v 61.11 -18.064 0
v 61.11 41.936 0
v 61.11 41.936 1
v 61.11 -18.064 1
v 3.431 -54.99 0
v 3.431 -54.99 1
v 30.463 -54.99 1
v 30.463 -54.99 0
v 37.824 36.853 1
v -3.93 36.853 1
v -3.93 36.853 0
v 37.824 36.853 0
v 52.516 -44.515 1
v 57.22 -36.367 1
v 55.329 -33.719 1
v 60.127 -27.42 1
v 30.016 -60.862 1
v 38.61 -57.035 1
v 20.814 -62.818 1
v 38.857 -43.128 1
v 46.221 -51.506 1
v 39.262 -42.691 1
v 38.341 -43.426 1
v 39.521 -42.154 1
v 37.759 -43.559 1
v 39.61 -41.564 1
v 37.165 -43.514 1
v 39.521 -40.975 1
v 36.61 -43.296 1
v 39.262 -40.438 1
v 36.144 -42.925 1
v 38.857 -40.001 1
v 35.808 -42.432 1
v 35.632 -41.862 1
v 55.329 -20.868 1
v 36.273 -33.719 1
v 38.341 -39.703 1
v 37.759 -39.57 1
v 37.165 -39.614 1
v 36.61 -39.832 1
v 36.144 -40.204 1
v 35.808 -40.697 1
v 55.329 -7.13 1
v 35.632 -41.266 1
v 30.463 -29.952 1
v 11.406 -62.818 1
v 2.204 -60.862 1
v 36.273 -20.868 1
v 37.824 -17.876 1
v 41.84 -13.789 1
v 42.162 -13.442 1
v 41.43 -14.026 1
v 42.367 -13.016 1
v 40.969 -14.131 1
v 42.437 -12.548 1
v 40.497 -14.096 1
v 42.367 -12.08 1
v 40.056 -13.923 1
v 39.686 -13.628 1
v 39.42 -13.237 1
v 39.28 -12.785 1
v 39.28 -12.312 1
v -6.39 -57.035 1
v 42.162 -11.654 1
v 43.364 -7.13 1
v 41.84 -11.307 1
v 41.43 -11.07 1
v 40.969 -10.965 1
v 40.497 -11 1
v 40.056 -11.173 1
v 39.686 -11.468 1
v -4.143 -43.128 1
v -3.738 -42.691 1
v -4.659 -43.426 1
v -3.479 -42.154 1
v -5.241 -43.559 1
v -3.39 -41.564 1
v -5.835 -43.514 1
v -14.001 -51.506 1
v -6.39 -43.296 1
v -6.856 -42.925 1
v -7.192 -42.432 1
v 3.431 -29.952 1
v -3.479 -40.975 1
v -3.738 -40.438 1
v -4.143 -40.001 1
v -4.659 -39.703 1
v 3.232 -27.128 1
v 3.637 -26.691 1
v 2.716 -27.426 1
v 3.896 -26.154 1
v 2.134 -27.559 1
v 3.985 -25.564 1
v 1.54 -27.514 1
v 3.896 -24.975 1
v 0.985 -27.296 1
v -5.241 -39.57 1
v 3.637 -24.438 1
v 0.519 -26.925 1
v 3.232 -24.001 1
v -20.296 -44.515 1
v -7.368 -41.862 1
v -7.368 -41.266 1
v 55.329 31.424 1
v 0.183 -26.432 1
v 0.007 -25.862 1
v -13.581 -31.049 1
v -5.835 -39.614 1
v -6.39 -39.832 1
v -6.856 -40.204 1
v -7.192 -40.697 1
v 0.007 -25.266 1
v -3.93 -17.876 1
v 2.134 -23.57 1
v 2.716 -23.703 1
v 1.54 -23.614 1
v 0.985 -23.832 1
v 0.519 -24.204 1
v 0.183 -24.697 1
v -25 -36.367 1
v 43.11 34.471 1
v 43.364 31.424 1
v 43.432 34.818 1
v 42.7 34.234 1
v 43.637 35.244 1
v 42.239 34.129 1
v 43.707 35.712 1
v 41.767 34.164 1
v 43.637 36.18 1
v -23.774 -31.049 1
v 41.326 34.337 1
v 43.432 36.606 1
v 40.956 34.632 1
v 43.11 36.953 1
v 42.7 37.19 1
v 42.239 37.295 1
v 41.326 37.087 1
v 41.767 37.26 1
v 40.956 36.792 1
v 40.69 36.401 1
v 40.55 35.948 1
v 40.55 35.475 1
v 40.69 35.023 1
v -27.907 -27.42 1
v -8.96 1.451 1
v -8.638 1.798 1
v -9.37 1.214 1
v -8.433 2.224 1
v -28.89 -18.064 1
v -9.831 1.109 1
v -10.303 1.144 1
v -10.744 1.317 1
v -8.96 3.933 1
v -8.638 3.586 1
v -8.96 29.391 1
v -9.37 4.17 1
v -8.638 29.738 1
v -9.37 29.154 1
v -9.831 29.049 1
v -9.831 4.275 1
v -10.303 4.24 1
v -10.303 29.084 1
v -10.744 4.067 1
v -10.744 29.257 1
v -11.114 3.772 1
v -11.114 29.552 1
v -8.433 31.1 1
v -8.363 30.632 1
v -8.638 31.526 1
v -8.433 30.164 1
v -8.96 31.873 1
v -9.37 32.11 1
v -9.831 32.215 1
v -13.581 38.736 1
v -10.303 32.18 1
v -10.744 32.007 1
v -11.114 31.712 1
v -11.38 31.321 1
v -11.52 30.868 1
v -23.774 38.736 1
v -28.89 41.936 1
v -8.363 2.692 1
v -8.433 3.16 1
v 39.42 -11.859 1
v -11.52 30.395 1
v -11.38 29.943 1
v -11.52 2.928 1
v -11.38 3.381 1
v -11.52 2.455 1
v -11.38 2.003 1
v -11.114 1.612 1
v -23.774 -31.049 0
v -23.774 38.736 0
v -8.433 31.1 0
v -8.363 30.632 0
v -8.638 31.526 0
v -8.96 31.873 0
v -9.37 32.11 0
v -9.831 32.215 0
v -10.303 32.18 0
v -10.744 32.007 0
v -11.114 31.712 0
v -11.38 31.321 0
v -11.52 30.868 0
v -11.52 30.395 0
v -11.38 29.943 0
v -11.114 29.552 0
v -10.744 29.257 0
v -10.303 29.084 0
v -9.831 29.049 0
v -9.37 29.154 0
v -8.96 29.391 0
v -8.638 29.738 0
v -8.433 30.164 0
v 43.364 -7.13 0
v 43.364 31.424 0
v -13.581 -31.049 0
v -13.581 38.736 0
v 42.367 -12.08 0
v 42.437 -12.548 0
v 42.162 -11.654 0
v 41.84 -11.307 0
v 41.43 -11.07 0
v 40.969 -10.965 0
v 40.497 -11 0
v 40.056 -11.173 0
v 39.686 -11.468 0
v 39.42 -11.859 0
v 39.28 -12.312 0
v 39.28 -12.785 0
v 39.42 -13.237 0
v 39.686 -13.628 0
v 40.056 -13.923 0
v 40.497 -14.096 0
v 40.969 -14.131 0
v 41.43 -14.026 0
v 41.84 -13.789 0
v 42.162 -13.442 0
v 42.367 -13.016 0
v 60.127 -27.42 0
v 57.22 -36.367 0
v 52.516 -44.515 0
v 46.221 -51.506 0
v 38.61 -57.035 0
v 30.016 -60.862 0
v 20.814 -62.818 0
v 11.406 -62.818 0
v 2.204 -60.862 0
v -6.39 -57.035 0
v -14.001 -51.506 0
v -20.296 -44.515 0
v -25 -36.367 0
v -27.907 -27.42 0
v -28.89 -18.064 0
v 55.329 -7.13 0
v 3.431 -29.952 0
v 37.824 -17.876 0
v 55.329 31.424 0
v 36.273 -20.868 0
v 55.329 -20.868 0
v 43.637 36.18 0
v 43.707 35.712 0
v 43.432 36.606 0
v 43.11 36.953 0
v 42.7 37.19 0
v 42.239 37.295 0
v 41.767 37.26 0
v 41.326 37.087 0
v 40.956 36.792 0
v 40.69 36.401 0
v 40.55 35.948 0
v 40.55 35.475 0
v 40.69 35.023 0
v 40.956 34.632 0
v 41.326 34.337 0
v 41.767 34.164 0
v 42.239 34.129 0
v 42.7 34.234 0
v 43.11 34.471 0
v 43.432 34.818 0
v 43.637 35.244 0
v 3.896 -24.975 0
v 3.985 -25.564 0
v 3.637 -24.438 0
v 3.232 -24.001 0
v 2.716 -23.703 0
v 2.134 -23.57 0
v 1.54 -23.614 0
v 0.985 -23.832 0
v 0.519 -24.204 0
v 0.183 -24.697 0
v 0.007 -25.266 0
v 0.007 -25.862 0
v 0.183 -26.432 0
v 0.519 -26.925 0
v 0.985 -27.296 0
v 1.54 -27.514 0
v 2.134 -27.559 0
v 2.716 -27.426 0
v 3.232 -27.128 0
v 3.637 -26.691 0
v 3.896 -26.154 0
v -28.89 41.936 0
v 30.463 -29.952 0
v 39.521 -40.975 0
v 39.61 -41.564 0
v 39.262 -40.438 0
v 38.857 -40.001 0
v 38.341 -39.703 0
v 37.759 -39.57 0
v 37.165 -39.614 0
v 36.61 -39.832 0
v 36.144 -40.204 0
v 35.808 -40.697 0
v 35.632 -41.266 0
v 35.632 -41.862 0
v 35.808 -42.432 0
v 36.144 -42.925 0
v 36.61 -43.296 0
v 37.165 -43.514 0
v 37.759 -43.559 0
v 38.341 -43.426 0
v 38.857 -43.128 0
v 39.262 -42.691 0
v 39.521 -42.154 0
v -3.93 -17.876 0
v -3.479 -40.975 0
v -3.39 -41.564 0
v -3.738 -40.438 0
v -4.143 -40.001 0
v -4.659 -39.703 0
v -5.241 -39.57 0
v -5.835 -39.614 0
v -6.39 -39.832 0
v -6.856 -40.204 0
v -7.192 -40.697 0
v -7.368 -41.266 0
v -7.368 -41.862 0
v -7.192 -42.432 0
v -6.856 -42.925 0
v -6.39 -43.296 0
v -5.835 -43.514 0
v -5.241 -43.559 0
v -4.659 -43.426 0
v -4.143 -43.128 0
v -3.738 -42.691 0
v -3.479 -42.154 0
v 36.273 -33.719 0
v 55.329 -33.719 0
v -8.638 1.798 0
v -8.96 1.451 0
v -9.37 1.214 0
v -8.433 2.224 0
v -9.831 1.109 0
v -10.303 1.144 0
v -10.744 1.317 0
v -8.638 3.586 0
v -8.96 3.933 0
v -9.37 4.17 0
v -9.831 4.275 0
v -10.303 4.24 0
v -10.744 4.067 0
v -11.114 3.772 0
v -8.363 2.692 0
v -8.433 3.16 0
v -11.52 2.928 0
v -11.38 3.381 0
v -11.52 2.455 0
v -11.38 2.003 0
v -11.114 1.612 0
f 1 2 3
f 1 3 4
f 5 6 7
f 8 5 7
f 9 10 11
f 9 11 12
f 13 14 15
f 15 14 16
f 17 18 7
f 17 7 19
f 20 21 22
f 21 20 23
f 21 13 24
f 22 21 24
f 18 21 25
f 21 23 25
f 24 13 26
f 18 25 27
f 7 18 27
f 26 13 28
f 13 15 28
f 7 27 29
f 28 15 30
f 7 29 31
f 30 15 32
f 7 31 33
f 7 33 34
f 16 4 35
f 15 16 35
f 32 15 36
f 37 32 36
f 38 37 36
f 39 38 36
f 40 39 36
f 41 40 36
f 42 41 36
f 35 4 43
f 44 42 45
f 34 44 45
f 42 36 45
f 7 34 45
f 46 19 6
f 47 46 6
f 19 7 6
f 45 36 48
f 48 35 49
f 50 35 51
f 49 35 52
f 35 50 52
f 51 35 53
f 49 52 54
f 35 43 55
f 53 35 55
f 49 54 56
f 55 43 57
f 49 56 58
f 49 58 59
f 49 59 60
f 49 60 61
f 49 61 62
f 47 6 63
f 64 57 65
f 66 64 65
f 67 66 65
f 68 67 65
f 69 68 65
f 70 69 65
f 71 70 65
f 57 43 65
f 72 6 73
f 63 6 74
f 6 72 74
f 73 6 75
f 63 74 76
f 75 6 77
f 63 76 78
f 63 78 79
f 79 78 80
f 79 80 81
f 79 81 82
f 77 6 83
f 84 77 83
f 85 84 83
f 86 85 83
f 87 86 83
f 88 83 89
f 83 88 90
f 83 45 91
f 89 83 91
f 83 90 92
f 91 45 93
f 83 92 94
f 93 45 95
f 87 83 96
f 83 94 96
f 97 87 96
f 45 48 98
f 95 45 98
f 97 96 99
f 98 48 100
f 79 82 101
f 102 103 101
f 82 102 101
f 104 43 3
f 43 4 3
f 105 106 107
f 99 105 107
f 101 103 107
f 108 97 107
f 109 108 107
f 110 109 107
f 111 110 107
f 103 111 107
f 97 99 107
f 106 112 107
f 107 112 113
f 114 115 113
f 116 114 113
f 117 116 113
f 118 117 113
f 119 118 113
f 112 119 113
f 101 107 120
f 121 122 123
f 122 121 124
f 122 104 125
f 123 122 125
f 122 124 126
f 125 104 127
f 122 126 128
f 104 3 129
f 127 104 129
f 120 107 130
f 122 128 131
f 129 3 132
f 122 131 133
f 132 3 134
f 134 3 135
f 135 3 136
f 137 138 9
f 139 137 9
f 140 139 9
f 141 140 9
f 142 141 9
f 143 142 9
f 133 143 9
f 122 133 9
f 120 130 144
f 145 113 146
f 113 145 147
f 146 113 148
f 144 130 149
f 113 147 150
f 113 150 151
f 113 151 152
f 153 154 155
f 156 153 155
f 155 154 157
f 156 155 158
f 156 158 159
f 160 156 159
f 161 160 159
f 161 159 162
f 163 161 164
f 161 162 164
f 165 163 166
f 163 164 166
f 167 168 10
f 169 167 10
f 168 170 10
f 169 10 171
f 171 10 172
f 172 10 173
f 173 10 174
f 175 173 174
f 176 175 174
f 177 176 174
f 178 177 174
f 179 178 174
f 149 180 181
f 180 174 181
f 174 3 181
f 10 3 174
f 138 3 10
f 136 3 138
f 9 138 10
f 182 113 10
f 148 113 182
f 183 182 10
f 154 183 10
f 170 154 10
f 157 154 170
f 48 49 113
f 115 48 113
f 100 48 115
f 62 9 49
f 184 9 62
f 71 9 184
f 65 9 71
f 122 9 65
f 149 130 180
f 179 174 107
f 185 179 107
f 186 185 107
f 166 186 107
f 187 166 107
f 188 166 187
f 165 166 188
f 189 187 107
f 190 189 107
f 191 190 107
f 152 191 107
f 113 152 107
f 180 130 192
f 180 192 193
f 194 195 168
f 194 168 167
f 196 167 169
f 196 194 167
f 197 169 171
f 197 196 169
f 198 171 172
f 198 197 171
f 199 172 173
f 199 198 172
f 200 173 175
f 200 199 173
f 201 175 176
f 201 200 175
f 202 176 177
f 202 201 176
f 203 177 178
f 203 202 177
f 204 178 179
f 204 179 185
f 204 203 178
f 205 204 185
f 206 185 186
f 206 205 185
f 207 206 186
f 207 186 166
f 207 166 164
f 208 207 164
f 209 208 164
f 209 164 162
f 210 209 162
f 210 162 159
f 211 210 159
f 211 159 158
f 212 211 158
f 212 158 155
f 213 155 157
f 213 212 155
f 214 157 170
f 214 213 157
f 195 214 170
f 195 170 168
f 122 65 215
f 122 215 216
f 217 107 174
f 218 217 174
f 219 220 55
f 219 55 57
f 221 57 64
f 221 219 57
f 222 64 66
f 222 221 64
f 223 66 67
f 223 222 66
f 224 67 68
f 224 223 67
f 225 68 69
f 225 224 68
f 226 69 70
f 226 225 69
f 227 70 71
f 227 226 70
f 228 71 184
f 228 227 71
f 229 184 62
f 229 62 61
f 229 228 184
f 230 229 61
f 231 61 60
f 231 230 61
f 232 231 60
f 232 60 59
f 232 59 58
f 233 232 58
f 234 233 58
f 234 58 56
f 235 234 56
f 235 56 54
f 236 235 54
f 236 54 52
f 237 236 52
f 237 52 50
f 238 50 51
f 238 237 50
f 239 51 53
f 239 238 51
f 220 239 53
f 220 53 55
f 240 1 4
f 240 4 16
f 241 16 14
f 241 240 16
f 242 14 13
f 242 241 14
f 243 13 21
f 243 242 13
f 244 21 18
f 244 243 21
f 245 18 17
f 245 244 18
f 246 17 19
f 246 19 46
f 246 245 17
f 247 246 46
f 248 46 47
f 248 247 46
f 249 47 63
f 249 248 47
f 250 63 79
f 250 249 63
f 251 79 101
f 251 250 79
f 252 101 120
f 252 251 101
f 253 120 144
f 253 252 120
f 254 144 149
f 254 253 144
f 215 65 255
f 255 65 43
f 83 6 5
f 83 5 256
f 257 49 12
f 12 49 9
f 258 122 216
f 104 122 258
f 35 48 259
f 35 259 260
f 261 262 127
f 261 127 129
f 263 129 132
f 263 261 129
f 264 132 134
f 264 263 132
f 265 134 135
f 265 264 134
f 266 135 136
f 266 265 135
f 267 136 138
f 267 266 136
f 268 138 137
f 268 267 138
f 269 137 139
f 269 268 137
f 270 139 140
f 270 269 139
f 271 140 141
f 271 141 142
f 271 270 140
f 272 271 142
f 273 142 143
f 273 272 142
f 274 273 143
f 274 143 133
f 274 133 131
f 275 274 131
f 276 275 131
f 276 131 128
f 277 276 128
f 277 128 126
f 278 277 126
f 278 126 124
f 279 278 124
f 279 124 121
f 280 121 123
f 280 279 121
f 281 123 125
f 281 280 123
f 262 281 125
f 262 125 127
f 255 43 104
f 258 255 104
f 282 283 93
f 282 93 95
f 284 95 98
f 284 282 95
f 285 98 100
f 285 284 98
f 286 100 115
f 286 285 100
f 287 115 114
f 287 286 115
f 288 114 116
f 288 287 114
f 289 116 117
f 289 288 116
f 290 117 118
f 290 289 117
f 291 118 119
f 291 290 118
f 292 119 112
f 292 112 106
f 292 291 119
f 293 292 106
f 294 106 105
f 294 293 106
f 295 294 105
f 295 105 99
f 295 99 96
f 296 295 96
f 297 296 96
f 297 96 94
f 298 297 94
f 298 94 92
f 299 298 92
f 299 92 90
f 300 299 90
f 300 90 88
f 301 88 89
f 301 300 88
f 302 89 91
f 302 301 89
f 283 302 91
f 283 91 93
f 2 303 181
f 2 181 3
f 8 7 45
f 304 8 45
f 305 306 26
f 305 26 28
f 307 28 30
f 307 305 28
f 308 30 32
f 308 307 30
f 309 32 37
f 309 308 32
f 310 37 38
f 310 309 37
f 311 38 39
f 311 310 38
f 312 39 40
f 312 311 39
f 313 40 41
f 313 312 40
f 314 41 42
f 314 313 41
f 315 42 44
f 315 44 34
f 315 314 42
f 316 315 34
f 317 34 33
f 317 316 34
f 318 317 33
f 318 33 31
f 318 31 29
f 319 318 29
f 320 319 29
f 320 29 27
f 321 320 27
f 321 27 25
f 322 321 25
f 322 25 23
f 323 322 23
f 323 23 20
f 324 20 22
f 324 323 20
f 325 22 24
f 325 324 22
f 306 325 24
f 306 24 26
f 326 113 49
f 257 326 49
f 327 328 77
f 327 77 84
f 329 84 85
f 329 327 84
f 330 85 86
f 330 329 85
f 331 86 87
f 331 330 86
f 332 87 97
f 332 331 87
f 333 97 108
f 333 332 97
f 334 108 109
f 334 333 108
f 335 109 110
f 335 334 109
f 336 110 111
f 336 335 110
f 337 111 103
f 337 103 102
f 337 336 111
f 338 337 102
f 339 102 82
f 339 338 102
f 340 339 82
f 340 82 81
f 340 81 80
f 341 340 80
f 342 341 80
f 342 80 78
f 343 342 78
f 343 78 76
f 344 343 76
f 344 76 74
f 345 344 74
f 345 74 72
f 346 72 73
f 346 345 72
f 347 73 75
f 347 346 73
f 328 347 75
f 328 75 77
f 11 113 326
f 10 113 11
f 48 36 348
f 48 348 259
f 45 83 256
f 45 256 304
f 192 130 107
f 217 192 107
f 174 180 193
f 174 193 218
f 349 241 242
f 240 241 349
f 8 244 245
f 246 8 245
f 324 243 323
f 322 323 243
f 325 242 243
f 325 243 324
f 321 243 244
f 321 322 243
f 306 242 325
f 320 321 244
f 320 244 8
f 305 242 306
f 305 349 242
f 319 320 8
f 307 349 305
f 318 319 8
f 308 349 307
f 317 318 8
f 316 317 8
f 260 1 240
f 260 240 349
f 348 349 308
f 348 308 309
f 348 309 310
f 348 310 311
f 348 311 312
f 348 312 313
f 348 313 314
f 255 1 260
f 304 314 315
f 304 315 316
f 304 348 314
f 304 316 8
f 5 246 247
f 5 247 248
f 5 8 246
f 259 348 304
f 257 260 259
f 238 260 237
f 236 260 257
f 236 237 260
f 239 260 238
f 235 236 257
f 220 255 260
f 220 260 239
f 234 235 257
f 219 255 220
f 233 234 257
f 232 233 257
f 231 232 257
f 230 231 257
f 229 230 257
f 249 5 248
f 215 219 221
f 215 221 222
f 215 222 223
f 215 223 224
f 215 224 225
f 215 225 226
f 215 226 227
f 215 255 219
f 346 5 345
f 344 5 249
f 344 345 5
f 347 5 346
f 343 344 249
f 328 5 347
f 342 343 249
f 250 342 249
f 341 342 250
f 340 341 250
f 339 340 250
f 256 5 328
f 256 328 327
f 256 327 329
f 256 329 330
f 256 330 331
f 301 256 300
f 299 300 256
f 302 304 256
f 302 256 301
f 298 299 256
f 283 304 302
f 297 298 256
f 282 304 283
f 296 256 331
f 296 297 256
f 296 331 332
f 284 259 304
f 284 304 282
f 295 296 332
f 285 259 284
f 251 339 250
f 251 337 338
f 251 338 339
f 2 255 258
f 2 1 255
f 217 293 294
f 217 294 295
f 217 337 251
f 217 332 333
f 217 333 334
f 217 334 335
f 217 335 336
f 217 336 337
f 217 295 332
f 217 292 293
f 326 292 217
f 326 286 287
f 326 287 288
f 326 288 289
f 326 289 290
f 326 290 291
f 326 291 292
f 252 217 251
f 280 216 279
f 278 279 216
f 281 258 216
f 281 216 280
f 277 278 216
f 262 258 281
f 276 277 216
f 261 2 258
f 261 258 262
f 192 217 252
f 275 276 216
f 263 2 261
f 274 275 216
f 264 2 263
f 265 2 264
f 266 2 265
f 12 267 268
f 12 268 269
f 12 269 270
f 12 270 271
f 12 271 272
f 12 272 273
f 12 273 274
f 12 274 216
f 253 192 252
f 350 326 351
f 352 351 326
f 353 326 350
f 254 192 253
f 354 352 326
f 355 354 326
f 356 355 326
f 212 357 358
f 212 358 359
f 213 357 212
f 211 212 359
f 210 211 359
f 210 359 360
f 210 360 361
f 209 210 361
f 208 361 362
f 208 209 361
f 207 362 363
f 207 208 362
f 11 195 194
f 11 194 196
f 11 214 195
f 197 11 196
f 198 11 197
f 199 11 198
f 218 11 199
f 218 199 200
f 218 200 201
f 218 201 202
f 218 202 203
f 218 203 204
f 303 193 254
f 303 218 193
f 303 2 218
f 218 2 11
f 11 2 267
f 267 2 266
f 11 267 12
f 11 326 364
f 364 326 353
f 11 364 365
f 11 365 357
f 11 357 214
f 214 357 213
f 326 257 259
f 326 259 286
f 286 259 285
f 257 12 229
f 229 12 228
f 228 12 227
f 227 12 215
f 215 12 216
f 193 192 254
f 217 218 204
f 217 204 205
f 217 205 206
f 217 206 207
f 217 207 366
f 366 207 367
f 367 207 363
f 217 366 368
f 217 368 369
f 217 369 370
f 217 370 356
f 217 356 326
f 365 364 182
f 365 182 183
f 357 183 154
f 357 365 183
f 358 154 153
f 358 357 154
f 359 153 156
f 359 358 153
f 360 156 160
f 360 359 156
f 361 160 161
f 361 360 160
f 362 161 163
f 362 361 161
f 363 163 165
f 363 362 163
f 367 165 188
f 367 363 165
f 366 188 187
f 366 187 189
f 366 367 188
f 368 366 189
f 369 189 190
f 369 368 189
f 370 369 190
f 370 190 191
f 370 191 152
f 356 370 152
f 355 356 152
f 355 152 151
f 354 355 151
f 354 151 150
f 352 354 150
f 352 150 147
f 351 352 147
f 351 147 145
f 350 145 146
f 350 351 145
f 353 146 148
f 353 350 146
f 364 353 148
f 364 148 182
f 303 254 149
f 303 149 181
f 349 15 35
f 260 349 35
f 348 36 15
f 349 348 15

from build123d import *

# Parameters (mm, degrees)
SKETCH1_R           = 2
SKETCH1_R_2         = 1.5875
BOSS_EXTRUDE1_DEPTH = 1
SKETCH2_W           = 41.754758497
SKETCH2_H           = 54.729261875
SKETCH2_W_2         = 10.192494114
SKETCH2_H_2         = 69.784905138
SKETCH2_W_3         = 27.032266999
SKETCH2_H_3         = 25.038083368
SKETCH2_W_4         = 11.965101787
SKETCH2_H_4         = 38.554216868
SKETCH2_W_5         = 19.055532475
SKETCH2_H_5         = 12.851405623
CUT_EXTRUDE1_DEPTH  = 2


with BuildPart() as part:
    # Sketch1 → Boss-Extrude1 (new body)
    with BuildSketch(Plane.XY):
        with BuildLine():
            Line((61.109996011, 41.935724429), (61.109996011, -18.064275571))
            ThreePointArc((61.109996011, -18.064275571), (16.109996011, -63.064275571), (-28.890003989, -18.064275571))
            Line((-28.890003989, -18.064275571), (-28.890003989, 41.935724429))
            Line((-28.890003989, 41.935724429), (61.109996011, 41.935724429))
        make_face()
        with Locations((37.609996011, -41.564275571)):
            Circle(SKETCH1_R, mode=Mode.SUBTRACT)
        with Locations((-5.390003989, -41.564275571)):
            Circle(SKETCH1_R, mode=Mode.SUBTRACT)
        with Locations((1.984996011, -25.564275571)):
            Circle(SKETCH1_R, mode=Mode.SUBTRACT)
        with Locations((-9.950003989, 2.691836123)):
            Circle(SKETCH1_R_2, mode=Mode.SUBTRACT)
        with Locations((40.849996011, -12.548163877)):
            Circle(SKETCH1_R_2, mode=Mode.SUBTRACT)
        with Locations((42.119996011, 35.711836123)):
            Circle(SKETCH1_R_2, mode=Mode.SUBTRACT)
        with Locations((-9.950003989, 30.631836123)):
            Circle(SKETCH1_R_2, mode=Mode.SUBTRACT)
    extrude(amount=BOSS_EXTRUDE1_DEPTH)

    # Sketch2 → Cut-Extrude1 (cut, through all)
    with BuildSketch(Plane.XY.offset(1)):
        with Locations((16.947060745, 9.488348719)):
            Rectangle(SKETCH2_W, SKETCH2_H)
        with Locations((-18.677429553, 3.843922739)):
            Rectangle(SKETCH2_W_2, SKETCH2_H_2)
        with Locations((16.947060745, -42.471213668)):
            Rectangle(SKETCH2_W_3, SKETCH2_H_3)
        with Locations((49.346389863, 12.147260227)):
            Rectangle(SKETCH2_W_4, SKETCH2_H_4)
        with Locations((45.801174519, -27.293260477)):
            Rectangle(SKETCH2_W_5, SKETCH2_H_5)
    extrude(amount=-CUT_EXTRUDE1_DEPTH, mode=Mode.SUBTRACT)


solid = part.part
